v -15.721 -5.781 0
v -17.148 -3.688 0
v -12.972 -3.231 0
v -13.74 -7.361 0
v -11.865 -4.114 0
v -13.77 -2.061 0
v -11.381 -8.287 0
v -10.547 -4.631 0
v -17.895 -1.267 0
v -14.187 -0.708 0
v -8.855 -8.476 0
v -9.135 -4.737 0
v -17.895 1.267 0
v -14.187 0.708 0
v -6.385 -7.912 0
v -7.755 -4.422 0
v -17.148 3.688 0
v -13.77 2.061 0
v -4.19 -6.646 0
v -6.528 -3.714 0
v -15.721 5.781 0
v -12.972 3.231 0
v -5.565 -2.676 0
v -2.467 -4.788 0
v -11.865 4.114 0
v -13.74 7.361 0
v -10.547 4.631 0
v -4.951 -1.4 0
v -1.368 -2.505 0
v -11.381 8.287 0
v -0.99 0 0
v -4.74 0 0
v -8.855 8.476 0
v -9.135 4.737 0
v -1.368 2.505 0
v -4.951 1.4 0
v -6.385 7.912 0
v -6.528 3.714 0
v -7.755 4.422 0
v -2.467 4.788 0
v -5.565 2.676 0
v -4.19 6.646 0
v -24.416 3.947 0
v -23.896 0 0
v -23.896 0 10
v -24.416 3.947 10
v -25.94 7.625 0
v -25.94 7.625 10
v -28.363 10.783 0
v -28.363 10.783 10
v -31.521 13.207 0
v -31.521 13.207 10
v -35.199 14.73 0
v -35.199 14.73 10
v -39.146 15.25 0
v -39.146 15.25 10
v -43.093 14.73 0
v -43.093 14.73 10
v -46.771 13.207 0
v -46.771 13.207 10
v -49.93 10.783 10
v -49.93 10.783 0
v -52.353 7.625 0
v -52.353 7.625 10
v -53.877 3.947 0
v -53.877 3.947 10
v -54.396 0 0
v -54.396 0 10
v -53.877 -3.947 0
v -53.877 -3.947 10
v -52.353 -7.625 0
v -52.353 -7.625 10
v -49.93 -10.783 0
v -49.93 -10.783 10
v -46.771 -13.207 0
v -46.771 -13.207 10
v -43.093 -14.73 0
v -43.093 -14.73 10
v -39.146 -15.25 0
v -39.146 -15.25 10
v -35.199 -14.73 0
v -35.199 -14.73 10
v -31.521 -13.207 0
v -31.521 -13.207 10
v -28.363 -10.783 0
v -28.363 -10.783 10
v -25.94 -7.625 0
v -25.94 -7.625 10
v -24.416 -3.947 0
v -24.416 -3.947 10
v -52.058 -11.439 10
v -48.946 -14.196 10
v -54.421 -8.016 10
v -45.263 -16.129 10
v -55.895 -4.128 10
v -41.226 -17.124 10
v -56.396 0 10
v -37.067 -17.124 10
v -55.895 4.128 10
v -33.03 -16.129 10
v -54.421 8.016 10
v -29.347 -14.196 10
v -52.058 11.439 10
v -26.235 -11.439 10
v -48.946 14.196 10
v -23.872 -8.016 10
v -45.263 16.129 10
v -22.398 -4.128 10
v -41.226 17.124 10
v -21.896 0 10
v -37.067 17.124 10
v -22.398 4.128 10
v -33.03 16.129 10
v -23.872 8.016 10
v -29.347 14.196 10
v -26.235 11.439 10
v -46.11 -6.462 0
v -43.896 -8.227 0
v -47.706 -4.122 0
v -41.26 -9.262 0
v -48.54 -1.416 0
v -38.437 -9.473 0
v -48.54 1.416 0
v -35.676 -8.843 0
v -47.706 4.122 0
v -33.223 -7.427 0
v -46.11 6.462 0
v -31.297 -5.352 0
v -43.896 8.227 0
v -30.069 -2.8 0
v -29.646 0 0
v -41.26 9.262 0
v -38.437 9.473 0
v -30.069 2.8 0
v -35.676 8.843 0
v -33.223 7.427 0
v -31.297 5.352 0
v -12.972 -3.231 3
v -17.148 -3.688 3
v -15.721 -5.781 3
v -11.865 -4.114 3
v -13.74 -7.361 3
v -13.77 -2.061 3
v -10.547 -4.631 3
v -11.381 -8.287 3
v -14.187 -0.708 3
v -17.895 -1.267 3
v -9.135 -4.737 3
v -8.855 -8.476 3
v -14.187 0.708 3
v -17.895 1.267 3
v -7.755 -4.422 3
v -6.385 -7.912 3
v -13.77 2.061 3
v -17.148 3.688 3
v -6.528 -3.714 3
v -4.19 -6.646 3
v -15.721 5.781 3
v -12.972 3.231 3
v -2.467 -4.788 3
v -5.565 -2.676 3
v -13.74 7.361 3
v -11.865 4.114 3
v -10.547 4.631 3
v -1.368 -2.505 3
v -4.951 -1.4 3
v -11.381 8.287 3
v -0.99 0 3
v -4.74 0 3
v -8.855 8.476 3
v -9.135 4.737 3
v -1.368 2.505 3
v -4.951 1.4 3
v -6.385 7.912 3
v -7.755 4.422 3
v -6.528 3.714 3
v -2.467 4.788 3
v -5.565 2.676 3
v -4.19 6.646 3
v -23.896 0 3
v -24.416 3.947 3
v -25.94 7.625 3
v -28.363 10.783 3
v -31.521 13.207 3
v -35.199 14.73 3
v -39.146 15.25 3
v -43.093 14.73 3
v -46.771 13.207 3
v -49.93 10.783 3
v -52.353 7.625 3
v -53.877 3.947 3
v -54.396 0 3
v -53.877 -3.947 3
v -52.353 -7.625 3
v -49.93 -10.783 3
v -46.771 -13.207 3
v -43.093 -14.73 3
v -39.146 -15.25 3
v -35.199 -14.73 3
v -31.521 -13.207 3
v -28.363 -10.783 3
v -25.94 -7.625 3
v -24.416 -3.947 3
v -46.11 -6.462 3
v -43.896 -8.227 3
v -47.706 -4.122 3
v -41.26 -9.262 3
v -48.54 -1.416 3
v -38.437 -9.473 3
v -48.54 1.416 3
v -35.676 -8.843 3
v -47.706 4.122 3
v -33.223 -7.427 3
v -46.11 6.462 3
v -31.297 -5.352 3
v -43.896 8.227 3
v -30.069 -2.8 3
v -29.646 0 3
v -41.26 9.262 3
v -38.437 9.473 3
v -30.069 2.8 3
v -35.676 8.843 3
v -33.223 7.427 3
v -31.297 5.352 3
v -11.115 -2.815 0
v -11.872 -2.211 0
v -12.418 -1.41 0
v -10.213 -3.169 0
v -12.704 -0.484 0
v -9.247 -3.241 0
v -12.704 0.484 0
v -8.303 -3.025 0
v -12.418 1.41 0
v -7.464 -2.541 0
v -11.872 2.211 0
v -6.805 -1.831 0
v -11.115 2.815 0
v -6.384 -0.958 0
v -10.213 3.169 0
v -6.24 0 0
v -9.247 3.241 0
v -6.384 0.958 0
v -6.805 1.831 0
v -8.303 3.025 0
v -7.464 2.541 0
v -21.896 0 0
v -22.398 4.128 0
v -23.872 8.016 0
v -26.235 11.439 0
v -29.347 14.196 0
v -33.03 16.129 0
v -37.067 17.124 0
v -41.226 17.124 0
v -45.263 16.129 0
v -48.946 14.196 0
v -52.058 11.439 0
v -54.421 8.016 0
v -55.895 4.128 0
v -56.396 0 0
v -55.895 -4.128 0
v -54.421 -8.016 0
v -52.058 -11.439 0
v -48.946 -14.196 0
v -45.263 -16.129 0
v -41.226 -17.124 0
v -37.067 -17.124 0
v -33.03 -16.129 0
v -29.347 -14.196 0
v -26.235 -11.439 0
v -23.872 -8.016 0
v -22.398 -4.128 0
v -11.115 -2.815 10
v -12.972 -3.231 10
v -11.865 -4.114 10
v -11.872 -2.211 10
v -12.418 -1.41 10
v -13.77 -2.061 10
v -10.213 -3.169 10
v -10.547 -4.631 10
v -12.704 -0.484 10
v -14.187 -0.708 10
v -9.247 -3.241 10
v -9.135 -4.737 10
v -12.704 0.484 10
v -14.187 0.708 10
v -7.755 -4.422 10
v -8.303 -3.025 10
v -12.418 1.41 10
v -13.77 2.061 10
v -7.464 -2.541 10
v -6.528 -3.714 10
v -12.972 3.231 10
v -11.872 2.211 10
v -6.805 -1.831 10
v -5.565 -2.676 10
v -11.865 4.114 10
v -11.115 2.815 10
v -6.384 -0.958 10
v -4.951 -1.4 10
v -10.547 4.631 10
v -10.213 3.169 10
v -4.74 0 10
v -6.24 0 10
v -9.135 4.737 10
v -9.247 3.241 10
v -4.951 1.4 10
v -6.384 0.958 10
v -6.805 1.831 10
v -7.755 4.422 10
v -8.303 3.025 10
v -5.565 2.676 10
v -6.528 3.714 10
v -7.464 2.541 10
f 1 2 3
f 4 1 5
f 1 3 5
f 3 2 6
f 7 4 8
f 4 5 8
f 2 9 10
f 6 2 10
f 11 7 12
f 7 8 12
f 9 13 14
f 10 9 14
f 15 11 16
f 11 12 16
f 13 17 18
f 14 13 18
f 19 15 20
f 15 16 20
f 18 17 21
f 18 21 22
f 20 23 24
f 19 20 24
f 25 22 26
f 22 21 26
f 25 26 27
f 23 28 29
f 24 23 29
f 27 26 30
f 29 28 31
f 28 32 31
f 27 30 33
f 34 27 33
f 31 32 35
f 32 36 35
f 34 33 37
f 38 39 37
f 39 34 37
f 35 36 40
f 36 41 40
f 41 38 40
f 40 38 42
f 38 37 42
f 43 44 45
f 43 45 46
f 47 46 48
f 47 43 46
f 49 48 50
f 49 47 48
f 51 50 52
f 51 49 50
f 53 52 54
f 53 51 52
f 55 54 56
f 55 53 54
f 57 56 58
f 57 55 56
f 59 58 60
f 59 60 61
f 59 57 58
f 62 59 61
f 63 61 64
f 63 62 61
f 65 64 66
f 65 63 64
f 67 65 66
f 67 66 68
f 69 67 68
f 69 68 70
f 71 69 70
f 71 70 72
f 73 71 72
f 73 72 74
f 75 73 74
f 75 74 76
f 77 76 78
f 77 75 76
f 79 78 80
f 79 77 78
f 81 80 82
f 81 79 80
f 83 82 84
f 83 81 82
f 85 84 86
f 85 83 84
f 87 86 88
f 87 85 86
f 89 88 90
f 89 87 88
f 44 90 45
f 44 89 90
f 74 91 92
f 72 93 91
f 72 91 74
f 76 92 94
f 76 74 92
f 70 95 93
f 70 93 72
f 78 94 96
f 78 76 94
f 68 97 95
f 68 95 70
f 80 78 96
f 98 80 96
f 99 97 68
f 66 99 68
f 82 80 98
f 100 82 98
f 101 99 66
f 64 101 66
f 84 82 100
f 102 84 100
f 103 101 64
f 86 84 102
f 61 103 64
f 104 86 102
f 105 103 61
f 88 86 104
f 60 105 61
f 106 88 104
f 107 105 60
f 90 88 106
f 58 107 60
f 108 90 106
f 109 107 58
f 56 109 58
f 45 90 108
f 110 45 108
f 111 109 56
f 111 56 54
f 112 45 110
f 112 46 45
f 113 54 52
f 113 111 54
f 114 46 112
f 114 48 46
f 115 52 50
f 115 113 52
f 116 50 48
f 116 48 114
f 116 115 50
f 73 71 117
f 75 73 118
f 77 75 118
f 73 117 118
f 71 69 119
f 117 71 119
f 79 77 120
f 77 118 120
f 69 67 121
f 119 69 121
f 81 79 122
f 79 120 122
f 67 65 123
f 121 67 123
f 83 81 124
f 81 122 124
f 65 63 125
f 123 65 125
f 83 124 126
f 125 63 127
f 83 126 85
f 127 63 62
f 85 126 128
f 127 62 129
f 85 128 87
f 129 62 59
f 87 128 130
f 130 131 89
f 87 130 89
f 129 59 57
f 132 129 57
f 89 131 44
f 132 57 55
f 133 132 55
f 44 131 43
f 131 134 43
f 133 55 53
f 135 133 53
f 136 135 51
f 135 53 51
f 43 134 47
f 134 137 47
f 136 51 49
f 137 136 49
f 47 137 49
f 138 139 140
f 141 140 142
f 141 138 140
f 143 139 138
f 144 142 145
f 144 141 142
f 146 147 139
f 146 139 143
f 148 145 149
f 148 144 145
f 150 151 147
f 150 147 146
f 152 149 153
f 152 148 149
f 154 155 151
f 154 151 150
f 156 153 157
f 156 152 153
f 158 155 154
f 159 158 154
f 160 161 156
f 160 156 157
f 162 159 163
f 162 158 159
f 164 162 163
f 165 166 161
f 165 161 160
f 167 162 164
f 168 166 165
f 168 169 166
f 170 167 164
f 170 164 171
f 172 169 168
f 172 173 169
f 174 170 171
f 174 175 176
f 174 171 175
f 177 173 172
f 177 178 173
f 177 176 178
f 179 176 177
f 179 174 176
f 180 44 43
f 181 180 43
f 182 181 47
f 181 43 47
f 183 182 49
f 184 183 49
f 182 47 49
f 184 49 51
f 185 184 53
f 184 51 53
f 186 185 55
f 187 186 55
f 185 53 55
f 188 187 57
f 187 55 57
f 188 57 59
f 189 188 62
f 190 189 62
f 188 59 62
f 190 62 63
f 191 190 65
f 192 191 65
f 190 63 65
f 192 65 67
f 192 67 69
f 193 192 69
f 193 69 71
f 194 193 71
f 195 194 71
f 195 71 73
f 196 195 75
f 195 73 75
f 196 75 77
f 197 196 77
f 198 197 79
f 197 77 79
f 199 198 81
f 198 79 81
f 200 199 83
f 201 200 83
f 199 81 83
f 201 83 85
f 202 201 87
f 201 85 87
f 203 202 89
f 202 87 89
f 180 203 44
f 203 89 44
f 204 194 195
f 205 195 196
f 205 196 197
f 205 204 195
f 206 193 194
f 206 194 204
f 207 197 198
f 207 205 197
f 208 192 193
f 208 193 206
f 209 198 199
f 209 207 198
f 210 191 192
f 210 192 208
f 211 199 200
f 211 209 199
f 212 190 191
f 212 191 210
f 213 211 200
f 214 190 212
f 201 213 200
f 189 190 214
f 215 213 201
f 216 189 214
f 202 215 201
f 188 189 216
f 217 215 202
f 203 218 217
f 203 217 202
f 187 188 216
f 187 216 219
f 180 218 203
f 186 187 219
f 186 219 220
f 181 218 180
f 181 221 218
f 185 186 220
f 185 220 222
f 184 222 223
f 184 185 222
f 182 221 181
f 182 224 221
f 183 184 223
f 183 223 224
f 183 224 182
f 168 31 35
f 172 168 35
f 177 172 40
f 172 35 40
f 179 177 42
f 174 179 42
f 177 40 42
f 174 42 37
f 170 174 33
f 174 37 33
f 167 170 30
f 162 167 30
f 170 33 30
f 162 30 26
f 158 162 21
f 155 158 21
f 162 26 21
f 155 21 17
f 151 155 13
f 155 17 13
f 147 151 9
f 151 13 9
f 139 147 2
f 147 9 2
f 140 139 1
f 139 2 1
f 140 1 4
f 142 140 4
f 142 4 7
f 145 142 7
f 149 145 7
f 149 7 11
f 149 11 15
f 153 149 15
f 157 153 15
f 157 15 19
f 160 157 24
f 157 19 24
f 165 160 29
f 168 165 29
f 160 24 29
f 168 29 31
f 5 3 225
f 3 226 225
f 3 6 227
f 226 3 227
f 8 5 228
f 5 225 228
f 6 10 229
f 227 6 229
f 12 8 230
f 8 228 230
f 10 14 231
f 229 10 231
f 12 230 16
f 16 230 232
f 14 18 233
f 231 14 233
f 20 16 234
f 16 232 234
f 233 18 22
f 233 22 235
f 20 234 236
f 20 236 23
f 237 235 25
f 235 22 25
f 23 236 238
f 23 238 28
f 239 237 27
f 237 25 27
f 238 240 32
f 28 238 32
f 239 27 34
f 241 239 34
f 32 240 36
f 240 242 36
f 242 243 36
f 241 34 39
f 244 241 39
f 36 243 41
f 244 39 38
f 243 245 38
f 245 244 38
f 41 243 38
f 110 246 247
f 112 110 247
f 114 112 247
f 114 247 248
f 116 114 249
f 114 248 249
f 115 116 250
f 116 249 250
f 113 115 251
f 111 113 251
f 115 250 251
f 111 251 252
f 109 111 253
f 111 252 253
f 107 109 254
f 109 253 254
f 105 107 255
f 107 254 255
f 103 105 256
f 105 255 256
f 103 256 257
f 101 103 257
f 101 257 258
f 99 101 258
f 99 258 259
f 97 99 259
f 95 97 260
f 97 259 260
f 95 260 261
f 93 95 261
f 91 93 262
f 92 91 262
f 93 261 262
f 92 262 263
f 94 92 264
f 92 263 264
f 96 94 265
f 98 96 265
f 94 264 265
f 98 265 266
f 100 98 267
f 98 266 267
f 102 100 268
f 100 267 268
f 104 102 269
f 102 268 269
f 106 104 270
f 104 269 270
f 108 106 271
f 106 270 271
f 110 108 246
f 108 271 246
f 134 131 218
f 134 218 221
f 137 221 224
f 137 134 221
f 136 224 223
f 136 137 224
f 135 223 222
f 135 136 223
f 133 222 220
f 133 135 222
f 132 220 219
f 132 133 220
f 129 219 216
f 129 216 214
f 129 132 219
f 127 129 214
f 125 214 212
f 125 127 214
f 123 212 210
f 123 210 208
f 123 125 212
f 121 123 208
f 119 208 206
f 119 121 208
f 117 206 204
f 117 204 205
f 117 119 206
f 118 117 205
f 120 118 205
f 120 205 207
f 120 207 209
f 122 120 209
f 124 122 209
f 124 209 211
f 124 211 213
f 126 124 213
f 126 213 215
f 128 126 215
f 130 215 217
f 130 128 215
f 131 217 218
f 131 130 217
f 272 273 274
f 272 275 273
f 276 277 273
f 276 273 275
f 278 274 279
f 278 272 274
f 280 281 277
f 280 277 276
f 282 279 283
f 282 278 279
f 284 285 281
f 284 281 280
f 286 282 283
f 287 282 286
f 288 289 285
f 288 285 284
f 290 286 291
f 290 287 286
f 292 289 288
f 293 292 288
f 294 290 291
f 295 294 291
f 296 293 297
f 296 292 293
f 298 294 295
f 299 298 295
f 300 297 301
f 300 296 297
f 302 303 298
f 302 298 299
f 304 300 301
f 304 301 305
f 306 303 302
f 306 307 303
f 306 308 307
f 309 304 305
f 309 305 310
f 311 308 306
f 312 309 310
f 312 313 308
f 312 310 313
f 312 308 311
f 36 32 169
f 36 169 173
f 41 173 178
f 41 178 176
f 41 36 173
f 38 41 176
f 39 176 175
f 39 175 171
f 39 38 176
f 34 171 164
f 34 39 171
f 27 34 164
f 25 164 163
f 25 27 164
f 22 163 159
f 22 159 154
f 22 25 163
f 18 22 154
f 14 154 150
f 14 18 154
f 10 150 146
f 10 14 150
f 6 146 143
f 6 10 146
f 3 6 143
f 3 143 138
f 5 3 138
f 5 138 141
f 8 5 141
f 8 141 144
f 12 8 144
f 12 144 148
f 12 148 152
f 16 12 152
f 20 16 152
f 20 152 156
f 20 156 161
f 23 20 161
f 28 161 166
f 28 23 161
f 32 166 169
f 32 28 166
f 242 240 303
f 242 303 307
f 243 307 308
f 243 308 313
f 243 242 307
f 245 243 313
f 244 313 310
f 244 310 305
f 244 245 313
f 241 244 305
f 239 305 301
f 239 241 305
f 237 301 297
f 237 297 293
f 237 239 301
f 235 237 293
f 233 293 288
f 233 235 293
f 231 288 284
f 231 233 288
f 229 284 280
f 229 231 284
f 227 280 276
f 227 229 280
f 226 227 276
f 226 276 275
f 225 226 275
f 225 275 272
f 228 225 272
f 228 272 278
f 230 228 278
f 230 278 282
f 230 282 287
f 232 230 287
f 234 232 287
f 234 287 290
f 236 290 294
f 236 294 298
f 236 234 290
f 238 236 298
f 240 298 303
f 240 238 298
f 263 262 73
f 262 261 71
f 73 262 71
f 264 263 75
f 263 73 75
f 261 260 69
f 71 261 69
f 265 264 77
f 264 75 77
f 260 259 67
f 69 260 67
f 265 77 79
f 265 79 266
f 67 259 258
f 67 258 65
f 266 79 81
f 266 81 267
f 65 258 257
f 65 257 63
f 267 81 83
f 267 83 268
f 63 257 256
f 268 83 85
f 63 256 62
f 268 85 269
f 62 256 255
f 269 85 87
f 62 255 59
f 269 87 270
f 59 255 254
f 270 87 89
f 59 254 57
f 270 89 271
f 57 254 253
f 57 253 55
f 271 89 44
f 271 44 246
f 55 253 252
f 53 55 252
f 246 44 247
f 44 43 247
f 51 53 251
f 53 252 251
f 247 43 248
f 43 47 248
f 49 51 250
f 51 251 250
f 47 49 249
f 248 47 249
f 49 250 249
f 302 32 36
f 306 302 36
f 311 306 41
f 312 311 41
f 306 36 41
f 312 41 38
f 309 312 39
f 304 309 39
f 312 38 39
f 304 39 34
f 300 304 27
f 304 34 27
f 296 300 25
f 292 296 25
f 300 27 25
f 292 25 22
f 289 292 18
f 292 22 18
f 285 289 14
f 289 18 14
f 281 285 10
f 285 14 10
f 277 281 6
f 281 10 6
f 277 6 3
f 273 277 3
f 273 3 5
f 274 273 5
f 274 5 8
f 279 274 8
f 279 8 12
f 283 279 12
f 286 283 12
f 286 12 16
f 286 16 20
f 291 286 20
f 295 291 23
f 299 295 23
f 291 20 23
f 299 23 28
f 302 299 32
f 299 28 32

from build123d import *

# Parameters (mm, degrees)
F0_R     = 15.25
F0_R_2   = 9.5
F0_R_3   = 8.5
F0_R_4   = 4.75
F1_DEPTH = 3
F0_R_5   = 17.25
F0_R_6   = 3.25
F2_DEPTH = 10


with BuildPart() as f1:
    # F0 (on Top) → F1 (new body)
    with BuildSketch(Plane.XY):
        with Locations((-39.146479, 0)):
            Circle(F0_R)
        with Locations((-39.146479, 0)):
            Circle(F0_R_2, mode=Mode.SUBTRACT)
        with Locations((-9.490055, 0)):
            Circle(F0_R_3)
        with Locations((-9.490055, 0)):
            Circle(F0_R_4, mode=Mode.SUBTRACT)
    extrude(amount=F1_DEPTH)


with BuildPart() as f2:
    # F0 (on Top) → F2 (new body)
    with BuildSketch(Plane.XY):
        with Locations((-39.146479, 0)):
            Circle(F0_R_5)
        with Locations((-39.146479, 0)):
            Circle(F0_R, mode=Mode.SUBTRACT)
        with Locations((-9.490055, 0)):
            Circle(F0_R_4)
        with Locations((-9.490055, 0)):
            Circle(F0_R_6, mode=Mode.SUBTRACT)
    extrude(amount=F2_DEPTH)


solid = Compound([f1.part, f2.part])
